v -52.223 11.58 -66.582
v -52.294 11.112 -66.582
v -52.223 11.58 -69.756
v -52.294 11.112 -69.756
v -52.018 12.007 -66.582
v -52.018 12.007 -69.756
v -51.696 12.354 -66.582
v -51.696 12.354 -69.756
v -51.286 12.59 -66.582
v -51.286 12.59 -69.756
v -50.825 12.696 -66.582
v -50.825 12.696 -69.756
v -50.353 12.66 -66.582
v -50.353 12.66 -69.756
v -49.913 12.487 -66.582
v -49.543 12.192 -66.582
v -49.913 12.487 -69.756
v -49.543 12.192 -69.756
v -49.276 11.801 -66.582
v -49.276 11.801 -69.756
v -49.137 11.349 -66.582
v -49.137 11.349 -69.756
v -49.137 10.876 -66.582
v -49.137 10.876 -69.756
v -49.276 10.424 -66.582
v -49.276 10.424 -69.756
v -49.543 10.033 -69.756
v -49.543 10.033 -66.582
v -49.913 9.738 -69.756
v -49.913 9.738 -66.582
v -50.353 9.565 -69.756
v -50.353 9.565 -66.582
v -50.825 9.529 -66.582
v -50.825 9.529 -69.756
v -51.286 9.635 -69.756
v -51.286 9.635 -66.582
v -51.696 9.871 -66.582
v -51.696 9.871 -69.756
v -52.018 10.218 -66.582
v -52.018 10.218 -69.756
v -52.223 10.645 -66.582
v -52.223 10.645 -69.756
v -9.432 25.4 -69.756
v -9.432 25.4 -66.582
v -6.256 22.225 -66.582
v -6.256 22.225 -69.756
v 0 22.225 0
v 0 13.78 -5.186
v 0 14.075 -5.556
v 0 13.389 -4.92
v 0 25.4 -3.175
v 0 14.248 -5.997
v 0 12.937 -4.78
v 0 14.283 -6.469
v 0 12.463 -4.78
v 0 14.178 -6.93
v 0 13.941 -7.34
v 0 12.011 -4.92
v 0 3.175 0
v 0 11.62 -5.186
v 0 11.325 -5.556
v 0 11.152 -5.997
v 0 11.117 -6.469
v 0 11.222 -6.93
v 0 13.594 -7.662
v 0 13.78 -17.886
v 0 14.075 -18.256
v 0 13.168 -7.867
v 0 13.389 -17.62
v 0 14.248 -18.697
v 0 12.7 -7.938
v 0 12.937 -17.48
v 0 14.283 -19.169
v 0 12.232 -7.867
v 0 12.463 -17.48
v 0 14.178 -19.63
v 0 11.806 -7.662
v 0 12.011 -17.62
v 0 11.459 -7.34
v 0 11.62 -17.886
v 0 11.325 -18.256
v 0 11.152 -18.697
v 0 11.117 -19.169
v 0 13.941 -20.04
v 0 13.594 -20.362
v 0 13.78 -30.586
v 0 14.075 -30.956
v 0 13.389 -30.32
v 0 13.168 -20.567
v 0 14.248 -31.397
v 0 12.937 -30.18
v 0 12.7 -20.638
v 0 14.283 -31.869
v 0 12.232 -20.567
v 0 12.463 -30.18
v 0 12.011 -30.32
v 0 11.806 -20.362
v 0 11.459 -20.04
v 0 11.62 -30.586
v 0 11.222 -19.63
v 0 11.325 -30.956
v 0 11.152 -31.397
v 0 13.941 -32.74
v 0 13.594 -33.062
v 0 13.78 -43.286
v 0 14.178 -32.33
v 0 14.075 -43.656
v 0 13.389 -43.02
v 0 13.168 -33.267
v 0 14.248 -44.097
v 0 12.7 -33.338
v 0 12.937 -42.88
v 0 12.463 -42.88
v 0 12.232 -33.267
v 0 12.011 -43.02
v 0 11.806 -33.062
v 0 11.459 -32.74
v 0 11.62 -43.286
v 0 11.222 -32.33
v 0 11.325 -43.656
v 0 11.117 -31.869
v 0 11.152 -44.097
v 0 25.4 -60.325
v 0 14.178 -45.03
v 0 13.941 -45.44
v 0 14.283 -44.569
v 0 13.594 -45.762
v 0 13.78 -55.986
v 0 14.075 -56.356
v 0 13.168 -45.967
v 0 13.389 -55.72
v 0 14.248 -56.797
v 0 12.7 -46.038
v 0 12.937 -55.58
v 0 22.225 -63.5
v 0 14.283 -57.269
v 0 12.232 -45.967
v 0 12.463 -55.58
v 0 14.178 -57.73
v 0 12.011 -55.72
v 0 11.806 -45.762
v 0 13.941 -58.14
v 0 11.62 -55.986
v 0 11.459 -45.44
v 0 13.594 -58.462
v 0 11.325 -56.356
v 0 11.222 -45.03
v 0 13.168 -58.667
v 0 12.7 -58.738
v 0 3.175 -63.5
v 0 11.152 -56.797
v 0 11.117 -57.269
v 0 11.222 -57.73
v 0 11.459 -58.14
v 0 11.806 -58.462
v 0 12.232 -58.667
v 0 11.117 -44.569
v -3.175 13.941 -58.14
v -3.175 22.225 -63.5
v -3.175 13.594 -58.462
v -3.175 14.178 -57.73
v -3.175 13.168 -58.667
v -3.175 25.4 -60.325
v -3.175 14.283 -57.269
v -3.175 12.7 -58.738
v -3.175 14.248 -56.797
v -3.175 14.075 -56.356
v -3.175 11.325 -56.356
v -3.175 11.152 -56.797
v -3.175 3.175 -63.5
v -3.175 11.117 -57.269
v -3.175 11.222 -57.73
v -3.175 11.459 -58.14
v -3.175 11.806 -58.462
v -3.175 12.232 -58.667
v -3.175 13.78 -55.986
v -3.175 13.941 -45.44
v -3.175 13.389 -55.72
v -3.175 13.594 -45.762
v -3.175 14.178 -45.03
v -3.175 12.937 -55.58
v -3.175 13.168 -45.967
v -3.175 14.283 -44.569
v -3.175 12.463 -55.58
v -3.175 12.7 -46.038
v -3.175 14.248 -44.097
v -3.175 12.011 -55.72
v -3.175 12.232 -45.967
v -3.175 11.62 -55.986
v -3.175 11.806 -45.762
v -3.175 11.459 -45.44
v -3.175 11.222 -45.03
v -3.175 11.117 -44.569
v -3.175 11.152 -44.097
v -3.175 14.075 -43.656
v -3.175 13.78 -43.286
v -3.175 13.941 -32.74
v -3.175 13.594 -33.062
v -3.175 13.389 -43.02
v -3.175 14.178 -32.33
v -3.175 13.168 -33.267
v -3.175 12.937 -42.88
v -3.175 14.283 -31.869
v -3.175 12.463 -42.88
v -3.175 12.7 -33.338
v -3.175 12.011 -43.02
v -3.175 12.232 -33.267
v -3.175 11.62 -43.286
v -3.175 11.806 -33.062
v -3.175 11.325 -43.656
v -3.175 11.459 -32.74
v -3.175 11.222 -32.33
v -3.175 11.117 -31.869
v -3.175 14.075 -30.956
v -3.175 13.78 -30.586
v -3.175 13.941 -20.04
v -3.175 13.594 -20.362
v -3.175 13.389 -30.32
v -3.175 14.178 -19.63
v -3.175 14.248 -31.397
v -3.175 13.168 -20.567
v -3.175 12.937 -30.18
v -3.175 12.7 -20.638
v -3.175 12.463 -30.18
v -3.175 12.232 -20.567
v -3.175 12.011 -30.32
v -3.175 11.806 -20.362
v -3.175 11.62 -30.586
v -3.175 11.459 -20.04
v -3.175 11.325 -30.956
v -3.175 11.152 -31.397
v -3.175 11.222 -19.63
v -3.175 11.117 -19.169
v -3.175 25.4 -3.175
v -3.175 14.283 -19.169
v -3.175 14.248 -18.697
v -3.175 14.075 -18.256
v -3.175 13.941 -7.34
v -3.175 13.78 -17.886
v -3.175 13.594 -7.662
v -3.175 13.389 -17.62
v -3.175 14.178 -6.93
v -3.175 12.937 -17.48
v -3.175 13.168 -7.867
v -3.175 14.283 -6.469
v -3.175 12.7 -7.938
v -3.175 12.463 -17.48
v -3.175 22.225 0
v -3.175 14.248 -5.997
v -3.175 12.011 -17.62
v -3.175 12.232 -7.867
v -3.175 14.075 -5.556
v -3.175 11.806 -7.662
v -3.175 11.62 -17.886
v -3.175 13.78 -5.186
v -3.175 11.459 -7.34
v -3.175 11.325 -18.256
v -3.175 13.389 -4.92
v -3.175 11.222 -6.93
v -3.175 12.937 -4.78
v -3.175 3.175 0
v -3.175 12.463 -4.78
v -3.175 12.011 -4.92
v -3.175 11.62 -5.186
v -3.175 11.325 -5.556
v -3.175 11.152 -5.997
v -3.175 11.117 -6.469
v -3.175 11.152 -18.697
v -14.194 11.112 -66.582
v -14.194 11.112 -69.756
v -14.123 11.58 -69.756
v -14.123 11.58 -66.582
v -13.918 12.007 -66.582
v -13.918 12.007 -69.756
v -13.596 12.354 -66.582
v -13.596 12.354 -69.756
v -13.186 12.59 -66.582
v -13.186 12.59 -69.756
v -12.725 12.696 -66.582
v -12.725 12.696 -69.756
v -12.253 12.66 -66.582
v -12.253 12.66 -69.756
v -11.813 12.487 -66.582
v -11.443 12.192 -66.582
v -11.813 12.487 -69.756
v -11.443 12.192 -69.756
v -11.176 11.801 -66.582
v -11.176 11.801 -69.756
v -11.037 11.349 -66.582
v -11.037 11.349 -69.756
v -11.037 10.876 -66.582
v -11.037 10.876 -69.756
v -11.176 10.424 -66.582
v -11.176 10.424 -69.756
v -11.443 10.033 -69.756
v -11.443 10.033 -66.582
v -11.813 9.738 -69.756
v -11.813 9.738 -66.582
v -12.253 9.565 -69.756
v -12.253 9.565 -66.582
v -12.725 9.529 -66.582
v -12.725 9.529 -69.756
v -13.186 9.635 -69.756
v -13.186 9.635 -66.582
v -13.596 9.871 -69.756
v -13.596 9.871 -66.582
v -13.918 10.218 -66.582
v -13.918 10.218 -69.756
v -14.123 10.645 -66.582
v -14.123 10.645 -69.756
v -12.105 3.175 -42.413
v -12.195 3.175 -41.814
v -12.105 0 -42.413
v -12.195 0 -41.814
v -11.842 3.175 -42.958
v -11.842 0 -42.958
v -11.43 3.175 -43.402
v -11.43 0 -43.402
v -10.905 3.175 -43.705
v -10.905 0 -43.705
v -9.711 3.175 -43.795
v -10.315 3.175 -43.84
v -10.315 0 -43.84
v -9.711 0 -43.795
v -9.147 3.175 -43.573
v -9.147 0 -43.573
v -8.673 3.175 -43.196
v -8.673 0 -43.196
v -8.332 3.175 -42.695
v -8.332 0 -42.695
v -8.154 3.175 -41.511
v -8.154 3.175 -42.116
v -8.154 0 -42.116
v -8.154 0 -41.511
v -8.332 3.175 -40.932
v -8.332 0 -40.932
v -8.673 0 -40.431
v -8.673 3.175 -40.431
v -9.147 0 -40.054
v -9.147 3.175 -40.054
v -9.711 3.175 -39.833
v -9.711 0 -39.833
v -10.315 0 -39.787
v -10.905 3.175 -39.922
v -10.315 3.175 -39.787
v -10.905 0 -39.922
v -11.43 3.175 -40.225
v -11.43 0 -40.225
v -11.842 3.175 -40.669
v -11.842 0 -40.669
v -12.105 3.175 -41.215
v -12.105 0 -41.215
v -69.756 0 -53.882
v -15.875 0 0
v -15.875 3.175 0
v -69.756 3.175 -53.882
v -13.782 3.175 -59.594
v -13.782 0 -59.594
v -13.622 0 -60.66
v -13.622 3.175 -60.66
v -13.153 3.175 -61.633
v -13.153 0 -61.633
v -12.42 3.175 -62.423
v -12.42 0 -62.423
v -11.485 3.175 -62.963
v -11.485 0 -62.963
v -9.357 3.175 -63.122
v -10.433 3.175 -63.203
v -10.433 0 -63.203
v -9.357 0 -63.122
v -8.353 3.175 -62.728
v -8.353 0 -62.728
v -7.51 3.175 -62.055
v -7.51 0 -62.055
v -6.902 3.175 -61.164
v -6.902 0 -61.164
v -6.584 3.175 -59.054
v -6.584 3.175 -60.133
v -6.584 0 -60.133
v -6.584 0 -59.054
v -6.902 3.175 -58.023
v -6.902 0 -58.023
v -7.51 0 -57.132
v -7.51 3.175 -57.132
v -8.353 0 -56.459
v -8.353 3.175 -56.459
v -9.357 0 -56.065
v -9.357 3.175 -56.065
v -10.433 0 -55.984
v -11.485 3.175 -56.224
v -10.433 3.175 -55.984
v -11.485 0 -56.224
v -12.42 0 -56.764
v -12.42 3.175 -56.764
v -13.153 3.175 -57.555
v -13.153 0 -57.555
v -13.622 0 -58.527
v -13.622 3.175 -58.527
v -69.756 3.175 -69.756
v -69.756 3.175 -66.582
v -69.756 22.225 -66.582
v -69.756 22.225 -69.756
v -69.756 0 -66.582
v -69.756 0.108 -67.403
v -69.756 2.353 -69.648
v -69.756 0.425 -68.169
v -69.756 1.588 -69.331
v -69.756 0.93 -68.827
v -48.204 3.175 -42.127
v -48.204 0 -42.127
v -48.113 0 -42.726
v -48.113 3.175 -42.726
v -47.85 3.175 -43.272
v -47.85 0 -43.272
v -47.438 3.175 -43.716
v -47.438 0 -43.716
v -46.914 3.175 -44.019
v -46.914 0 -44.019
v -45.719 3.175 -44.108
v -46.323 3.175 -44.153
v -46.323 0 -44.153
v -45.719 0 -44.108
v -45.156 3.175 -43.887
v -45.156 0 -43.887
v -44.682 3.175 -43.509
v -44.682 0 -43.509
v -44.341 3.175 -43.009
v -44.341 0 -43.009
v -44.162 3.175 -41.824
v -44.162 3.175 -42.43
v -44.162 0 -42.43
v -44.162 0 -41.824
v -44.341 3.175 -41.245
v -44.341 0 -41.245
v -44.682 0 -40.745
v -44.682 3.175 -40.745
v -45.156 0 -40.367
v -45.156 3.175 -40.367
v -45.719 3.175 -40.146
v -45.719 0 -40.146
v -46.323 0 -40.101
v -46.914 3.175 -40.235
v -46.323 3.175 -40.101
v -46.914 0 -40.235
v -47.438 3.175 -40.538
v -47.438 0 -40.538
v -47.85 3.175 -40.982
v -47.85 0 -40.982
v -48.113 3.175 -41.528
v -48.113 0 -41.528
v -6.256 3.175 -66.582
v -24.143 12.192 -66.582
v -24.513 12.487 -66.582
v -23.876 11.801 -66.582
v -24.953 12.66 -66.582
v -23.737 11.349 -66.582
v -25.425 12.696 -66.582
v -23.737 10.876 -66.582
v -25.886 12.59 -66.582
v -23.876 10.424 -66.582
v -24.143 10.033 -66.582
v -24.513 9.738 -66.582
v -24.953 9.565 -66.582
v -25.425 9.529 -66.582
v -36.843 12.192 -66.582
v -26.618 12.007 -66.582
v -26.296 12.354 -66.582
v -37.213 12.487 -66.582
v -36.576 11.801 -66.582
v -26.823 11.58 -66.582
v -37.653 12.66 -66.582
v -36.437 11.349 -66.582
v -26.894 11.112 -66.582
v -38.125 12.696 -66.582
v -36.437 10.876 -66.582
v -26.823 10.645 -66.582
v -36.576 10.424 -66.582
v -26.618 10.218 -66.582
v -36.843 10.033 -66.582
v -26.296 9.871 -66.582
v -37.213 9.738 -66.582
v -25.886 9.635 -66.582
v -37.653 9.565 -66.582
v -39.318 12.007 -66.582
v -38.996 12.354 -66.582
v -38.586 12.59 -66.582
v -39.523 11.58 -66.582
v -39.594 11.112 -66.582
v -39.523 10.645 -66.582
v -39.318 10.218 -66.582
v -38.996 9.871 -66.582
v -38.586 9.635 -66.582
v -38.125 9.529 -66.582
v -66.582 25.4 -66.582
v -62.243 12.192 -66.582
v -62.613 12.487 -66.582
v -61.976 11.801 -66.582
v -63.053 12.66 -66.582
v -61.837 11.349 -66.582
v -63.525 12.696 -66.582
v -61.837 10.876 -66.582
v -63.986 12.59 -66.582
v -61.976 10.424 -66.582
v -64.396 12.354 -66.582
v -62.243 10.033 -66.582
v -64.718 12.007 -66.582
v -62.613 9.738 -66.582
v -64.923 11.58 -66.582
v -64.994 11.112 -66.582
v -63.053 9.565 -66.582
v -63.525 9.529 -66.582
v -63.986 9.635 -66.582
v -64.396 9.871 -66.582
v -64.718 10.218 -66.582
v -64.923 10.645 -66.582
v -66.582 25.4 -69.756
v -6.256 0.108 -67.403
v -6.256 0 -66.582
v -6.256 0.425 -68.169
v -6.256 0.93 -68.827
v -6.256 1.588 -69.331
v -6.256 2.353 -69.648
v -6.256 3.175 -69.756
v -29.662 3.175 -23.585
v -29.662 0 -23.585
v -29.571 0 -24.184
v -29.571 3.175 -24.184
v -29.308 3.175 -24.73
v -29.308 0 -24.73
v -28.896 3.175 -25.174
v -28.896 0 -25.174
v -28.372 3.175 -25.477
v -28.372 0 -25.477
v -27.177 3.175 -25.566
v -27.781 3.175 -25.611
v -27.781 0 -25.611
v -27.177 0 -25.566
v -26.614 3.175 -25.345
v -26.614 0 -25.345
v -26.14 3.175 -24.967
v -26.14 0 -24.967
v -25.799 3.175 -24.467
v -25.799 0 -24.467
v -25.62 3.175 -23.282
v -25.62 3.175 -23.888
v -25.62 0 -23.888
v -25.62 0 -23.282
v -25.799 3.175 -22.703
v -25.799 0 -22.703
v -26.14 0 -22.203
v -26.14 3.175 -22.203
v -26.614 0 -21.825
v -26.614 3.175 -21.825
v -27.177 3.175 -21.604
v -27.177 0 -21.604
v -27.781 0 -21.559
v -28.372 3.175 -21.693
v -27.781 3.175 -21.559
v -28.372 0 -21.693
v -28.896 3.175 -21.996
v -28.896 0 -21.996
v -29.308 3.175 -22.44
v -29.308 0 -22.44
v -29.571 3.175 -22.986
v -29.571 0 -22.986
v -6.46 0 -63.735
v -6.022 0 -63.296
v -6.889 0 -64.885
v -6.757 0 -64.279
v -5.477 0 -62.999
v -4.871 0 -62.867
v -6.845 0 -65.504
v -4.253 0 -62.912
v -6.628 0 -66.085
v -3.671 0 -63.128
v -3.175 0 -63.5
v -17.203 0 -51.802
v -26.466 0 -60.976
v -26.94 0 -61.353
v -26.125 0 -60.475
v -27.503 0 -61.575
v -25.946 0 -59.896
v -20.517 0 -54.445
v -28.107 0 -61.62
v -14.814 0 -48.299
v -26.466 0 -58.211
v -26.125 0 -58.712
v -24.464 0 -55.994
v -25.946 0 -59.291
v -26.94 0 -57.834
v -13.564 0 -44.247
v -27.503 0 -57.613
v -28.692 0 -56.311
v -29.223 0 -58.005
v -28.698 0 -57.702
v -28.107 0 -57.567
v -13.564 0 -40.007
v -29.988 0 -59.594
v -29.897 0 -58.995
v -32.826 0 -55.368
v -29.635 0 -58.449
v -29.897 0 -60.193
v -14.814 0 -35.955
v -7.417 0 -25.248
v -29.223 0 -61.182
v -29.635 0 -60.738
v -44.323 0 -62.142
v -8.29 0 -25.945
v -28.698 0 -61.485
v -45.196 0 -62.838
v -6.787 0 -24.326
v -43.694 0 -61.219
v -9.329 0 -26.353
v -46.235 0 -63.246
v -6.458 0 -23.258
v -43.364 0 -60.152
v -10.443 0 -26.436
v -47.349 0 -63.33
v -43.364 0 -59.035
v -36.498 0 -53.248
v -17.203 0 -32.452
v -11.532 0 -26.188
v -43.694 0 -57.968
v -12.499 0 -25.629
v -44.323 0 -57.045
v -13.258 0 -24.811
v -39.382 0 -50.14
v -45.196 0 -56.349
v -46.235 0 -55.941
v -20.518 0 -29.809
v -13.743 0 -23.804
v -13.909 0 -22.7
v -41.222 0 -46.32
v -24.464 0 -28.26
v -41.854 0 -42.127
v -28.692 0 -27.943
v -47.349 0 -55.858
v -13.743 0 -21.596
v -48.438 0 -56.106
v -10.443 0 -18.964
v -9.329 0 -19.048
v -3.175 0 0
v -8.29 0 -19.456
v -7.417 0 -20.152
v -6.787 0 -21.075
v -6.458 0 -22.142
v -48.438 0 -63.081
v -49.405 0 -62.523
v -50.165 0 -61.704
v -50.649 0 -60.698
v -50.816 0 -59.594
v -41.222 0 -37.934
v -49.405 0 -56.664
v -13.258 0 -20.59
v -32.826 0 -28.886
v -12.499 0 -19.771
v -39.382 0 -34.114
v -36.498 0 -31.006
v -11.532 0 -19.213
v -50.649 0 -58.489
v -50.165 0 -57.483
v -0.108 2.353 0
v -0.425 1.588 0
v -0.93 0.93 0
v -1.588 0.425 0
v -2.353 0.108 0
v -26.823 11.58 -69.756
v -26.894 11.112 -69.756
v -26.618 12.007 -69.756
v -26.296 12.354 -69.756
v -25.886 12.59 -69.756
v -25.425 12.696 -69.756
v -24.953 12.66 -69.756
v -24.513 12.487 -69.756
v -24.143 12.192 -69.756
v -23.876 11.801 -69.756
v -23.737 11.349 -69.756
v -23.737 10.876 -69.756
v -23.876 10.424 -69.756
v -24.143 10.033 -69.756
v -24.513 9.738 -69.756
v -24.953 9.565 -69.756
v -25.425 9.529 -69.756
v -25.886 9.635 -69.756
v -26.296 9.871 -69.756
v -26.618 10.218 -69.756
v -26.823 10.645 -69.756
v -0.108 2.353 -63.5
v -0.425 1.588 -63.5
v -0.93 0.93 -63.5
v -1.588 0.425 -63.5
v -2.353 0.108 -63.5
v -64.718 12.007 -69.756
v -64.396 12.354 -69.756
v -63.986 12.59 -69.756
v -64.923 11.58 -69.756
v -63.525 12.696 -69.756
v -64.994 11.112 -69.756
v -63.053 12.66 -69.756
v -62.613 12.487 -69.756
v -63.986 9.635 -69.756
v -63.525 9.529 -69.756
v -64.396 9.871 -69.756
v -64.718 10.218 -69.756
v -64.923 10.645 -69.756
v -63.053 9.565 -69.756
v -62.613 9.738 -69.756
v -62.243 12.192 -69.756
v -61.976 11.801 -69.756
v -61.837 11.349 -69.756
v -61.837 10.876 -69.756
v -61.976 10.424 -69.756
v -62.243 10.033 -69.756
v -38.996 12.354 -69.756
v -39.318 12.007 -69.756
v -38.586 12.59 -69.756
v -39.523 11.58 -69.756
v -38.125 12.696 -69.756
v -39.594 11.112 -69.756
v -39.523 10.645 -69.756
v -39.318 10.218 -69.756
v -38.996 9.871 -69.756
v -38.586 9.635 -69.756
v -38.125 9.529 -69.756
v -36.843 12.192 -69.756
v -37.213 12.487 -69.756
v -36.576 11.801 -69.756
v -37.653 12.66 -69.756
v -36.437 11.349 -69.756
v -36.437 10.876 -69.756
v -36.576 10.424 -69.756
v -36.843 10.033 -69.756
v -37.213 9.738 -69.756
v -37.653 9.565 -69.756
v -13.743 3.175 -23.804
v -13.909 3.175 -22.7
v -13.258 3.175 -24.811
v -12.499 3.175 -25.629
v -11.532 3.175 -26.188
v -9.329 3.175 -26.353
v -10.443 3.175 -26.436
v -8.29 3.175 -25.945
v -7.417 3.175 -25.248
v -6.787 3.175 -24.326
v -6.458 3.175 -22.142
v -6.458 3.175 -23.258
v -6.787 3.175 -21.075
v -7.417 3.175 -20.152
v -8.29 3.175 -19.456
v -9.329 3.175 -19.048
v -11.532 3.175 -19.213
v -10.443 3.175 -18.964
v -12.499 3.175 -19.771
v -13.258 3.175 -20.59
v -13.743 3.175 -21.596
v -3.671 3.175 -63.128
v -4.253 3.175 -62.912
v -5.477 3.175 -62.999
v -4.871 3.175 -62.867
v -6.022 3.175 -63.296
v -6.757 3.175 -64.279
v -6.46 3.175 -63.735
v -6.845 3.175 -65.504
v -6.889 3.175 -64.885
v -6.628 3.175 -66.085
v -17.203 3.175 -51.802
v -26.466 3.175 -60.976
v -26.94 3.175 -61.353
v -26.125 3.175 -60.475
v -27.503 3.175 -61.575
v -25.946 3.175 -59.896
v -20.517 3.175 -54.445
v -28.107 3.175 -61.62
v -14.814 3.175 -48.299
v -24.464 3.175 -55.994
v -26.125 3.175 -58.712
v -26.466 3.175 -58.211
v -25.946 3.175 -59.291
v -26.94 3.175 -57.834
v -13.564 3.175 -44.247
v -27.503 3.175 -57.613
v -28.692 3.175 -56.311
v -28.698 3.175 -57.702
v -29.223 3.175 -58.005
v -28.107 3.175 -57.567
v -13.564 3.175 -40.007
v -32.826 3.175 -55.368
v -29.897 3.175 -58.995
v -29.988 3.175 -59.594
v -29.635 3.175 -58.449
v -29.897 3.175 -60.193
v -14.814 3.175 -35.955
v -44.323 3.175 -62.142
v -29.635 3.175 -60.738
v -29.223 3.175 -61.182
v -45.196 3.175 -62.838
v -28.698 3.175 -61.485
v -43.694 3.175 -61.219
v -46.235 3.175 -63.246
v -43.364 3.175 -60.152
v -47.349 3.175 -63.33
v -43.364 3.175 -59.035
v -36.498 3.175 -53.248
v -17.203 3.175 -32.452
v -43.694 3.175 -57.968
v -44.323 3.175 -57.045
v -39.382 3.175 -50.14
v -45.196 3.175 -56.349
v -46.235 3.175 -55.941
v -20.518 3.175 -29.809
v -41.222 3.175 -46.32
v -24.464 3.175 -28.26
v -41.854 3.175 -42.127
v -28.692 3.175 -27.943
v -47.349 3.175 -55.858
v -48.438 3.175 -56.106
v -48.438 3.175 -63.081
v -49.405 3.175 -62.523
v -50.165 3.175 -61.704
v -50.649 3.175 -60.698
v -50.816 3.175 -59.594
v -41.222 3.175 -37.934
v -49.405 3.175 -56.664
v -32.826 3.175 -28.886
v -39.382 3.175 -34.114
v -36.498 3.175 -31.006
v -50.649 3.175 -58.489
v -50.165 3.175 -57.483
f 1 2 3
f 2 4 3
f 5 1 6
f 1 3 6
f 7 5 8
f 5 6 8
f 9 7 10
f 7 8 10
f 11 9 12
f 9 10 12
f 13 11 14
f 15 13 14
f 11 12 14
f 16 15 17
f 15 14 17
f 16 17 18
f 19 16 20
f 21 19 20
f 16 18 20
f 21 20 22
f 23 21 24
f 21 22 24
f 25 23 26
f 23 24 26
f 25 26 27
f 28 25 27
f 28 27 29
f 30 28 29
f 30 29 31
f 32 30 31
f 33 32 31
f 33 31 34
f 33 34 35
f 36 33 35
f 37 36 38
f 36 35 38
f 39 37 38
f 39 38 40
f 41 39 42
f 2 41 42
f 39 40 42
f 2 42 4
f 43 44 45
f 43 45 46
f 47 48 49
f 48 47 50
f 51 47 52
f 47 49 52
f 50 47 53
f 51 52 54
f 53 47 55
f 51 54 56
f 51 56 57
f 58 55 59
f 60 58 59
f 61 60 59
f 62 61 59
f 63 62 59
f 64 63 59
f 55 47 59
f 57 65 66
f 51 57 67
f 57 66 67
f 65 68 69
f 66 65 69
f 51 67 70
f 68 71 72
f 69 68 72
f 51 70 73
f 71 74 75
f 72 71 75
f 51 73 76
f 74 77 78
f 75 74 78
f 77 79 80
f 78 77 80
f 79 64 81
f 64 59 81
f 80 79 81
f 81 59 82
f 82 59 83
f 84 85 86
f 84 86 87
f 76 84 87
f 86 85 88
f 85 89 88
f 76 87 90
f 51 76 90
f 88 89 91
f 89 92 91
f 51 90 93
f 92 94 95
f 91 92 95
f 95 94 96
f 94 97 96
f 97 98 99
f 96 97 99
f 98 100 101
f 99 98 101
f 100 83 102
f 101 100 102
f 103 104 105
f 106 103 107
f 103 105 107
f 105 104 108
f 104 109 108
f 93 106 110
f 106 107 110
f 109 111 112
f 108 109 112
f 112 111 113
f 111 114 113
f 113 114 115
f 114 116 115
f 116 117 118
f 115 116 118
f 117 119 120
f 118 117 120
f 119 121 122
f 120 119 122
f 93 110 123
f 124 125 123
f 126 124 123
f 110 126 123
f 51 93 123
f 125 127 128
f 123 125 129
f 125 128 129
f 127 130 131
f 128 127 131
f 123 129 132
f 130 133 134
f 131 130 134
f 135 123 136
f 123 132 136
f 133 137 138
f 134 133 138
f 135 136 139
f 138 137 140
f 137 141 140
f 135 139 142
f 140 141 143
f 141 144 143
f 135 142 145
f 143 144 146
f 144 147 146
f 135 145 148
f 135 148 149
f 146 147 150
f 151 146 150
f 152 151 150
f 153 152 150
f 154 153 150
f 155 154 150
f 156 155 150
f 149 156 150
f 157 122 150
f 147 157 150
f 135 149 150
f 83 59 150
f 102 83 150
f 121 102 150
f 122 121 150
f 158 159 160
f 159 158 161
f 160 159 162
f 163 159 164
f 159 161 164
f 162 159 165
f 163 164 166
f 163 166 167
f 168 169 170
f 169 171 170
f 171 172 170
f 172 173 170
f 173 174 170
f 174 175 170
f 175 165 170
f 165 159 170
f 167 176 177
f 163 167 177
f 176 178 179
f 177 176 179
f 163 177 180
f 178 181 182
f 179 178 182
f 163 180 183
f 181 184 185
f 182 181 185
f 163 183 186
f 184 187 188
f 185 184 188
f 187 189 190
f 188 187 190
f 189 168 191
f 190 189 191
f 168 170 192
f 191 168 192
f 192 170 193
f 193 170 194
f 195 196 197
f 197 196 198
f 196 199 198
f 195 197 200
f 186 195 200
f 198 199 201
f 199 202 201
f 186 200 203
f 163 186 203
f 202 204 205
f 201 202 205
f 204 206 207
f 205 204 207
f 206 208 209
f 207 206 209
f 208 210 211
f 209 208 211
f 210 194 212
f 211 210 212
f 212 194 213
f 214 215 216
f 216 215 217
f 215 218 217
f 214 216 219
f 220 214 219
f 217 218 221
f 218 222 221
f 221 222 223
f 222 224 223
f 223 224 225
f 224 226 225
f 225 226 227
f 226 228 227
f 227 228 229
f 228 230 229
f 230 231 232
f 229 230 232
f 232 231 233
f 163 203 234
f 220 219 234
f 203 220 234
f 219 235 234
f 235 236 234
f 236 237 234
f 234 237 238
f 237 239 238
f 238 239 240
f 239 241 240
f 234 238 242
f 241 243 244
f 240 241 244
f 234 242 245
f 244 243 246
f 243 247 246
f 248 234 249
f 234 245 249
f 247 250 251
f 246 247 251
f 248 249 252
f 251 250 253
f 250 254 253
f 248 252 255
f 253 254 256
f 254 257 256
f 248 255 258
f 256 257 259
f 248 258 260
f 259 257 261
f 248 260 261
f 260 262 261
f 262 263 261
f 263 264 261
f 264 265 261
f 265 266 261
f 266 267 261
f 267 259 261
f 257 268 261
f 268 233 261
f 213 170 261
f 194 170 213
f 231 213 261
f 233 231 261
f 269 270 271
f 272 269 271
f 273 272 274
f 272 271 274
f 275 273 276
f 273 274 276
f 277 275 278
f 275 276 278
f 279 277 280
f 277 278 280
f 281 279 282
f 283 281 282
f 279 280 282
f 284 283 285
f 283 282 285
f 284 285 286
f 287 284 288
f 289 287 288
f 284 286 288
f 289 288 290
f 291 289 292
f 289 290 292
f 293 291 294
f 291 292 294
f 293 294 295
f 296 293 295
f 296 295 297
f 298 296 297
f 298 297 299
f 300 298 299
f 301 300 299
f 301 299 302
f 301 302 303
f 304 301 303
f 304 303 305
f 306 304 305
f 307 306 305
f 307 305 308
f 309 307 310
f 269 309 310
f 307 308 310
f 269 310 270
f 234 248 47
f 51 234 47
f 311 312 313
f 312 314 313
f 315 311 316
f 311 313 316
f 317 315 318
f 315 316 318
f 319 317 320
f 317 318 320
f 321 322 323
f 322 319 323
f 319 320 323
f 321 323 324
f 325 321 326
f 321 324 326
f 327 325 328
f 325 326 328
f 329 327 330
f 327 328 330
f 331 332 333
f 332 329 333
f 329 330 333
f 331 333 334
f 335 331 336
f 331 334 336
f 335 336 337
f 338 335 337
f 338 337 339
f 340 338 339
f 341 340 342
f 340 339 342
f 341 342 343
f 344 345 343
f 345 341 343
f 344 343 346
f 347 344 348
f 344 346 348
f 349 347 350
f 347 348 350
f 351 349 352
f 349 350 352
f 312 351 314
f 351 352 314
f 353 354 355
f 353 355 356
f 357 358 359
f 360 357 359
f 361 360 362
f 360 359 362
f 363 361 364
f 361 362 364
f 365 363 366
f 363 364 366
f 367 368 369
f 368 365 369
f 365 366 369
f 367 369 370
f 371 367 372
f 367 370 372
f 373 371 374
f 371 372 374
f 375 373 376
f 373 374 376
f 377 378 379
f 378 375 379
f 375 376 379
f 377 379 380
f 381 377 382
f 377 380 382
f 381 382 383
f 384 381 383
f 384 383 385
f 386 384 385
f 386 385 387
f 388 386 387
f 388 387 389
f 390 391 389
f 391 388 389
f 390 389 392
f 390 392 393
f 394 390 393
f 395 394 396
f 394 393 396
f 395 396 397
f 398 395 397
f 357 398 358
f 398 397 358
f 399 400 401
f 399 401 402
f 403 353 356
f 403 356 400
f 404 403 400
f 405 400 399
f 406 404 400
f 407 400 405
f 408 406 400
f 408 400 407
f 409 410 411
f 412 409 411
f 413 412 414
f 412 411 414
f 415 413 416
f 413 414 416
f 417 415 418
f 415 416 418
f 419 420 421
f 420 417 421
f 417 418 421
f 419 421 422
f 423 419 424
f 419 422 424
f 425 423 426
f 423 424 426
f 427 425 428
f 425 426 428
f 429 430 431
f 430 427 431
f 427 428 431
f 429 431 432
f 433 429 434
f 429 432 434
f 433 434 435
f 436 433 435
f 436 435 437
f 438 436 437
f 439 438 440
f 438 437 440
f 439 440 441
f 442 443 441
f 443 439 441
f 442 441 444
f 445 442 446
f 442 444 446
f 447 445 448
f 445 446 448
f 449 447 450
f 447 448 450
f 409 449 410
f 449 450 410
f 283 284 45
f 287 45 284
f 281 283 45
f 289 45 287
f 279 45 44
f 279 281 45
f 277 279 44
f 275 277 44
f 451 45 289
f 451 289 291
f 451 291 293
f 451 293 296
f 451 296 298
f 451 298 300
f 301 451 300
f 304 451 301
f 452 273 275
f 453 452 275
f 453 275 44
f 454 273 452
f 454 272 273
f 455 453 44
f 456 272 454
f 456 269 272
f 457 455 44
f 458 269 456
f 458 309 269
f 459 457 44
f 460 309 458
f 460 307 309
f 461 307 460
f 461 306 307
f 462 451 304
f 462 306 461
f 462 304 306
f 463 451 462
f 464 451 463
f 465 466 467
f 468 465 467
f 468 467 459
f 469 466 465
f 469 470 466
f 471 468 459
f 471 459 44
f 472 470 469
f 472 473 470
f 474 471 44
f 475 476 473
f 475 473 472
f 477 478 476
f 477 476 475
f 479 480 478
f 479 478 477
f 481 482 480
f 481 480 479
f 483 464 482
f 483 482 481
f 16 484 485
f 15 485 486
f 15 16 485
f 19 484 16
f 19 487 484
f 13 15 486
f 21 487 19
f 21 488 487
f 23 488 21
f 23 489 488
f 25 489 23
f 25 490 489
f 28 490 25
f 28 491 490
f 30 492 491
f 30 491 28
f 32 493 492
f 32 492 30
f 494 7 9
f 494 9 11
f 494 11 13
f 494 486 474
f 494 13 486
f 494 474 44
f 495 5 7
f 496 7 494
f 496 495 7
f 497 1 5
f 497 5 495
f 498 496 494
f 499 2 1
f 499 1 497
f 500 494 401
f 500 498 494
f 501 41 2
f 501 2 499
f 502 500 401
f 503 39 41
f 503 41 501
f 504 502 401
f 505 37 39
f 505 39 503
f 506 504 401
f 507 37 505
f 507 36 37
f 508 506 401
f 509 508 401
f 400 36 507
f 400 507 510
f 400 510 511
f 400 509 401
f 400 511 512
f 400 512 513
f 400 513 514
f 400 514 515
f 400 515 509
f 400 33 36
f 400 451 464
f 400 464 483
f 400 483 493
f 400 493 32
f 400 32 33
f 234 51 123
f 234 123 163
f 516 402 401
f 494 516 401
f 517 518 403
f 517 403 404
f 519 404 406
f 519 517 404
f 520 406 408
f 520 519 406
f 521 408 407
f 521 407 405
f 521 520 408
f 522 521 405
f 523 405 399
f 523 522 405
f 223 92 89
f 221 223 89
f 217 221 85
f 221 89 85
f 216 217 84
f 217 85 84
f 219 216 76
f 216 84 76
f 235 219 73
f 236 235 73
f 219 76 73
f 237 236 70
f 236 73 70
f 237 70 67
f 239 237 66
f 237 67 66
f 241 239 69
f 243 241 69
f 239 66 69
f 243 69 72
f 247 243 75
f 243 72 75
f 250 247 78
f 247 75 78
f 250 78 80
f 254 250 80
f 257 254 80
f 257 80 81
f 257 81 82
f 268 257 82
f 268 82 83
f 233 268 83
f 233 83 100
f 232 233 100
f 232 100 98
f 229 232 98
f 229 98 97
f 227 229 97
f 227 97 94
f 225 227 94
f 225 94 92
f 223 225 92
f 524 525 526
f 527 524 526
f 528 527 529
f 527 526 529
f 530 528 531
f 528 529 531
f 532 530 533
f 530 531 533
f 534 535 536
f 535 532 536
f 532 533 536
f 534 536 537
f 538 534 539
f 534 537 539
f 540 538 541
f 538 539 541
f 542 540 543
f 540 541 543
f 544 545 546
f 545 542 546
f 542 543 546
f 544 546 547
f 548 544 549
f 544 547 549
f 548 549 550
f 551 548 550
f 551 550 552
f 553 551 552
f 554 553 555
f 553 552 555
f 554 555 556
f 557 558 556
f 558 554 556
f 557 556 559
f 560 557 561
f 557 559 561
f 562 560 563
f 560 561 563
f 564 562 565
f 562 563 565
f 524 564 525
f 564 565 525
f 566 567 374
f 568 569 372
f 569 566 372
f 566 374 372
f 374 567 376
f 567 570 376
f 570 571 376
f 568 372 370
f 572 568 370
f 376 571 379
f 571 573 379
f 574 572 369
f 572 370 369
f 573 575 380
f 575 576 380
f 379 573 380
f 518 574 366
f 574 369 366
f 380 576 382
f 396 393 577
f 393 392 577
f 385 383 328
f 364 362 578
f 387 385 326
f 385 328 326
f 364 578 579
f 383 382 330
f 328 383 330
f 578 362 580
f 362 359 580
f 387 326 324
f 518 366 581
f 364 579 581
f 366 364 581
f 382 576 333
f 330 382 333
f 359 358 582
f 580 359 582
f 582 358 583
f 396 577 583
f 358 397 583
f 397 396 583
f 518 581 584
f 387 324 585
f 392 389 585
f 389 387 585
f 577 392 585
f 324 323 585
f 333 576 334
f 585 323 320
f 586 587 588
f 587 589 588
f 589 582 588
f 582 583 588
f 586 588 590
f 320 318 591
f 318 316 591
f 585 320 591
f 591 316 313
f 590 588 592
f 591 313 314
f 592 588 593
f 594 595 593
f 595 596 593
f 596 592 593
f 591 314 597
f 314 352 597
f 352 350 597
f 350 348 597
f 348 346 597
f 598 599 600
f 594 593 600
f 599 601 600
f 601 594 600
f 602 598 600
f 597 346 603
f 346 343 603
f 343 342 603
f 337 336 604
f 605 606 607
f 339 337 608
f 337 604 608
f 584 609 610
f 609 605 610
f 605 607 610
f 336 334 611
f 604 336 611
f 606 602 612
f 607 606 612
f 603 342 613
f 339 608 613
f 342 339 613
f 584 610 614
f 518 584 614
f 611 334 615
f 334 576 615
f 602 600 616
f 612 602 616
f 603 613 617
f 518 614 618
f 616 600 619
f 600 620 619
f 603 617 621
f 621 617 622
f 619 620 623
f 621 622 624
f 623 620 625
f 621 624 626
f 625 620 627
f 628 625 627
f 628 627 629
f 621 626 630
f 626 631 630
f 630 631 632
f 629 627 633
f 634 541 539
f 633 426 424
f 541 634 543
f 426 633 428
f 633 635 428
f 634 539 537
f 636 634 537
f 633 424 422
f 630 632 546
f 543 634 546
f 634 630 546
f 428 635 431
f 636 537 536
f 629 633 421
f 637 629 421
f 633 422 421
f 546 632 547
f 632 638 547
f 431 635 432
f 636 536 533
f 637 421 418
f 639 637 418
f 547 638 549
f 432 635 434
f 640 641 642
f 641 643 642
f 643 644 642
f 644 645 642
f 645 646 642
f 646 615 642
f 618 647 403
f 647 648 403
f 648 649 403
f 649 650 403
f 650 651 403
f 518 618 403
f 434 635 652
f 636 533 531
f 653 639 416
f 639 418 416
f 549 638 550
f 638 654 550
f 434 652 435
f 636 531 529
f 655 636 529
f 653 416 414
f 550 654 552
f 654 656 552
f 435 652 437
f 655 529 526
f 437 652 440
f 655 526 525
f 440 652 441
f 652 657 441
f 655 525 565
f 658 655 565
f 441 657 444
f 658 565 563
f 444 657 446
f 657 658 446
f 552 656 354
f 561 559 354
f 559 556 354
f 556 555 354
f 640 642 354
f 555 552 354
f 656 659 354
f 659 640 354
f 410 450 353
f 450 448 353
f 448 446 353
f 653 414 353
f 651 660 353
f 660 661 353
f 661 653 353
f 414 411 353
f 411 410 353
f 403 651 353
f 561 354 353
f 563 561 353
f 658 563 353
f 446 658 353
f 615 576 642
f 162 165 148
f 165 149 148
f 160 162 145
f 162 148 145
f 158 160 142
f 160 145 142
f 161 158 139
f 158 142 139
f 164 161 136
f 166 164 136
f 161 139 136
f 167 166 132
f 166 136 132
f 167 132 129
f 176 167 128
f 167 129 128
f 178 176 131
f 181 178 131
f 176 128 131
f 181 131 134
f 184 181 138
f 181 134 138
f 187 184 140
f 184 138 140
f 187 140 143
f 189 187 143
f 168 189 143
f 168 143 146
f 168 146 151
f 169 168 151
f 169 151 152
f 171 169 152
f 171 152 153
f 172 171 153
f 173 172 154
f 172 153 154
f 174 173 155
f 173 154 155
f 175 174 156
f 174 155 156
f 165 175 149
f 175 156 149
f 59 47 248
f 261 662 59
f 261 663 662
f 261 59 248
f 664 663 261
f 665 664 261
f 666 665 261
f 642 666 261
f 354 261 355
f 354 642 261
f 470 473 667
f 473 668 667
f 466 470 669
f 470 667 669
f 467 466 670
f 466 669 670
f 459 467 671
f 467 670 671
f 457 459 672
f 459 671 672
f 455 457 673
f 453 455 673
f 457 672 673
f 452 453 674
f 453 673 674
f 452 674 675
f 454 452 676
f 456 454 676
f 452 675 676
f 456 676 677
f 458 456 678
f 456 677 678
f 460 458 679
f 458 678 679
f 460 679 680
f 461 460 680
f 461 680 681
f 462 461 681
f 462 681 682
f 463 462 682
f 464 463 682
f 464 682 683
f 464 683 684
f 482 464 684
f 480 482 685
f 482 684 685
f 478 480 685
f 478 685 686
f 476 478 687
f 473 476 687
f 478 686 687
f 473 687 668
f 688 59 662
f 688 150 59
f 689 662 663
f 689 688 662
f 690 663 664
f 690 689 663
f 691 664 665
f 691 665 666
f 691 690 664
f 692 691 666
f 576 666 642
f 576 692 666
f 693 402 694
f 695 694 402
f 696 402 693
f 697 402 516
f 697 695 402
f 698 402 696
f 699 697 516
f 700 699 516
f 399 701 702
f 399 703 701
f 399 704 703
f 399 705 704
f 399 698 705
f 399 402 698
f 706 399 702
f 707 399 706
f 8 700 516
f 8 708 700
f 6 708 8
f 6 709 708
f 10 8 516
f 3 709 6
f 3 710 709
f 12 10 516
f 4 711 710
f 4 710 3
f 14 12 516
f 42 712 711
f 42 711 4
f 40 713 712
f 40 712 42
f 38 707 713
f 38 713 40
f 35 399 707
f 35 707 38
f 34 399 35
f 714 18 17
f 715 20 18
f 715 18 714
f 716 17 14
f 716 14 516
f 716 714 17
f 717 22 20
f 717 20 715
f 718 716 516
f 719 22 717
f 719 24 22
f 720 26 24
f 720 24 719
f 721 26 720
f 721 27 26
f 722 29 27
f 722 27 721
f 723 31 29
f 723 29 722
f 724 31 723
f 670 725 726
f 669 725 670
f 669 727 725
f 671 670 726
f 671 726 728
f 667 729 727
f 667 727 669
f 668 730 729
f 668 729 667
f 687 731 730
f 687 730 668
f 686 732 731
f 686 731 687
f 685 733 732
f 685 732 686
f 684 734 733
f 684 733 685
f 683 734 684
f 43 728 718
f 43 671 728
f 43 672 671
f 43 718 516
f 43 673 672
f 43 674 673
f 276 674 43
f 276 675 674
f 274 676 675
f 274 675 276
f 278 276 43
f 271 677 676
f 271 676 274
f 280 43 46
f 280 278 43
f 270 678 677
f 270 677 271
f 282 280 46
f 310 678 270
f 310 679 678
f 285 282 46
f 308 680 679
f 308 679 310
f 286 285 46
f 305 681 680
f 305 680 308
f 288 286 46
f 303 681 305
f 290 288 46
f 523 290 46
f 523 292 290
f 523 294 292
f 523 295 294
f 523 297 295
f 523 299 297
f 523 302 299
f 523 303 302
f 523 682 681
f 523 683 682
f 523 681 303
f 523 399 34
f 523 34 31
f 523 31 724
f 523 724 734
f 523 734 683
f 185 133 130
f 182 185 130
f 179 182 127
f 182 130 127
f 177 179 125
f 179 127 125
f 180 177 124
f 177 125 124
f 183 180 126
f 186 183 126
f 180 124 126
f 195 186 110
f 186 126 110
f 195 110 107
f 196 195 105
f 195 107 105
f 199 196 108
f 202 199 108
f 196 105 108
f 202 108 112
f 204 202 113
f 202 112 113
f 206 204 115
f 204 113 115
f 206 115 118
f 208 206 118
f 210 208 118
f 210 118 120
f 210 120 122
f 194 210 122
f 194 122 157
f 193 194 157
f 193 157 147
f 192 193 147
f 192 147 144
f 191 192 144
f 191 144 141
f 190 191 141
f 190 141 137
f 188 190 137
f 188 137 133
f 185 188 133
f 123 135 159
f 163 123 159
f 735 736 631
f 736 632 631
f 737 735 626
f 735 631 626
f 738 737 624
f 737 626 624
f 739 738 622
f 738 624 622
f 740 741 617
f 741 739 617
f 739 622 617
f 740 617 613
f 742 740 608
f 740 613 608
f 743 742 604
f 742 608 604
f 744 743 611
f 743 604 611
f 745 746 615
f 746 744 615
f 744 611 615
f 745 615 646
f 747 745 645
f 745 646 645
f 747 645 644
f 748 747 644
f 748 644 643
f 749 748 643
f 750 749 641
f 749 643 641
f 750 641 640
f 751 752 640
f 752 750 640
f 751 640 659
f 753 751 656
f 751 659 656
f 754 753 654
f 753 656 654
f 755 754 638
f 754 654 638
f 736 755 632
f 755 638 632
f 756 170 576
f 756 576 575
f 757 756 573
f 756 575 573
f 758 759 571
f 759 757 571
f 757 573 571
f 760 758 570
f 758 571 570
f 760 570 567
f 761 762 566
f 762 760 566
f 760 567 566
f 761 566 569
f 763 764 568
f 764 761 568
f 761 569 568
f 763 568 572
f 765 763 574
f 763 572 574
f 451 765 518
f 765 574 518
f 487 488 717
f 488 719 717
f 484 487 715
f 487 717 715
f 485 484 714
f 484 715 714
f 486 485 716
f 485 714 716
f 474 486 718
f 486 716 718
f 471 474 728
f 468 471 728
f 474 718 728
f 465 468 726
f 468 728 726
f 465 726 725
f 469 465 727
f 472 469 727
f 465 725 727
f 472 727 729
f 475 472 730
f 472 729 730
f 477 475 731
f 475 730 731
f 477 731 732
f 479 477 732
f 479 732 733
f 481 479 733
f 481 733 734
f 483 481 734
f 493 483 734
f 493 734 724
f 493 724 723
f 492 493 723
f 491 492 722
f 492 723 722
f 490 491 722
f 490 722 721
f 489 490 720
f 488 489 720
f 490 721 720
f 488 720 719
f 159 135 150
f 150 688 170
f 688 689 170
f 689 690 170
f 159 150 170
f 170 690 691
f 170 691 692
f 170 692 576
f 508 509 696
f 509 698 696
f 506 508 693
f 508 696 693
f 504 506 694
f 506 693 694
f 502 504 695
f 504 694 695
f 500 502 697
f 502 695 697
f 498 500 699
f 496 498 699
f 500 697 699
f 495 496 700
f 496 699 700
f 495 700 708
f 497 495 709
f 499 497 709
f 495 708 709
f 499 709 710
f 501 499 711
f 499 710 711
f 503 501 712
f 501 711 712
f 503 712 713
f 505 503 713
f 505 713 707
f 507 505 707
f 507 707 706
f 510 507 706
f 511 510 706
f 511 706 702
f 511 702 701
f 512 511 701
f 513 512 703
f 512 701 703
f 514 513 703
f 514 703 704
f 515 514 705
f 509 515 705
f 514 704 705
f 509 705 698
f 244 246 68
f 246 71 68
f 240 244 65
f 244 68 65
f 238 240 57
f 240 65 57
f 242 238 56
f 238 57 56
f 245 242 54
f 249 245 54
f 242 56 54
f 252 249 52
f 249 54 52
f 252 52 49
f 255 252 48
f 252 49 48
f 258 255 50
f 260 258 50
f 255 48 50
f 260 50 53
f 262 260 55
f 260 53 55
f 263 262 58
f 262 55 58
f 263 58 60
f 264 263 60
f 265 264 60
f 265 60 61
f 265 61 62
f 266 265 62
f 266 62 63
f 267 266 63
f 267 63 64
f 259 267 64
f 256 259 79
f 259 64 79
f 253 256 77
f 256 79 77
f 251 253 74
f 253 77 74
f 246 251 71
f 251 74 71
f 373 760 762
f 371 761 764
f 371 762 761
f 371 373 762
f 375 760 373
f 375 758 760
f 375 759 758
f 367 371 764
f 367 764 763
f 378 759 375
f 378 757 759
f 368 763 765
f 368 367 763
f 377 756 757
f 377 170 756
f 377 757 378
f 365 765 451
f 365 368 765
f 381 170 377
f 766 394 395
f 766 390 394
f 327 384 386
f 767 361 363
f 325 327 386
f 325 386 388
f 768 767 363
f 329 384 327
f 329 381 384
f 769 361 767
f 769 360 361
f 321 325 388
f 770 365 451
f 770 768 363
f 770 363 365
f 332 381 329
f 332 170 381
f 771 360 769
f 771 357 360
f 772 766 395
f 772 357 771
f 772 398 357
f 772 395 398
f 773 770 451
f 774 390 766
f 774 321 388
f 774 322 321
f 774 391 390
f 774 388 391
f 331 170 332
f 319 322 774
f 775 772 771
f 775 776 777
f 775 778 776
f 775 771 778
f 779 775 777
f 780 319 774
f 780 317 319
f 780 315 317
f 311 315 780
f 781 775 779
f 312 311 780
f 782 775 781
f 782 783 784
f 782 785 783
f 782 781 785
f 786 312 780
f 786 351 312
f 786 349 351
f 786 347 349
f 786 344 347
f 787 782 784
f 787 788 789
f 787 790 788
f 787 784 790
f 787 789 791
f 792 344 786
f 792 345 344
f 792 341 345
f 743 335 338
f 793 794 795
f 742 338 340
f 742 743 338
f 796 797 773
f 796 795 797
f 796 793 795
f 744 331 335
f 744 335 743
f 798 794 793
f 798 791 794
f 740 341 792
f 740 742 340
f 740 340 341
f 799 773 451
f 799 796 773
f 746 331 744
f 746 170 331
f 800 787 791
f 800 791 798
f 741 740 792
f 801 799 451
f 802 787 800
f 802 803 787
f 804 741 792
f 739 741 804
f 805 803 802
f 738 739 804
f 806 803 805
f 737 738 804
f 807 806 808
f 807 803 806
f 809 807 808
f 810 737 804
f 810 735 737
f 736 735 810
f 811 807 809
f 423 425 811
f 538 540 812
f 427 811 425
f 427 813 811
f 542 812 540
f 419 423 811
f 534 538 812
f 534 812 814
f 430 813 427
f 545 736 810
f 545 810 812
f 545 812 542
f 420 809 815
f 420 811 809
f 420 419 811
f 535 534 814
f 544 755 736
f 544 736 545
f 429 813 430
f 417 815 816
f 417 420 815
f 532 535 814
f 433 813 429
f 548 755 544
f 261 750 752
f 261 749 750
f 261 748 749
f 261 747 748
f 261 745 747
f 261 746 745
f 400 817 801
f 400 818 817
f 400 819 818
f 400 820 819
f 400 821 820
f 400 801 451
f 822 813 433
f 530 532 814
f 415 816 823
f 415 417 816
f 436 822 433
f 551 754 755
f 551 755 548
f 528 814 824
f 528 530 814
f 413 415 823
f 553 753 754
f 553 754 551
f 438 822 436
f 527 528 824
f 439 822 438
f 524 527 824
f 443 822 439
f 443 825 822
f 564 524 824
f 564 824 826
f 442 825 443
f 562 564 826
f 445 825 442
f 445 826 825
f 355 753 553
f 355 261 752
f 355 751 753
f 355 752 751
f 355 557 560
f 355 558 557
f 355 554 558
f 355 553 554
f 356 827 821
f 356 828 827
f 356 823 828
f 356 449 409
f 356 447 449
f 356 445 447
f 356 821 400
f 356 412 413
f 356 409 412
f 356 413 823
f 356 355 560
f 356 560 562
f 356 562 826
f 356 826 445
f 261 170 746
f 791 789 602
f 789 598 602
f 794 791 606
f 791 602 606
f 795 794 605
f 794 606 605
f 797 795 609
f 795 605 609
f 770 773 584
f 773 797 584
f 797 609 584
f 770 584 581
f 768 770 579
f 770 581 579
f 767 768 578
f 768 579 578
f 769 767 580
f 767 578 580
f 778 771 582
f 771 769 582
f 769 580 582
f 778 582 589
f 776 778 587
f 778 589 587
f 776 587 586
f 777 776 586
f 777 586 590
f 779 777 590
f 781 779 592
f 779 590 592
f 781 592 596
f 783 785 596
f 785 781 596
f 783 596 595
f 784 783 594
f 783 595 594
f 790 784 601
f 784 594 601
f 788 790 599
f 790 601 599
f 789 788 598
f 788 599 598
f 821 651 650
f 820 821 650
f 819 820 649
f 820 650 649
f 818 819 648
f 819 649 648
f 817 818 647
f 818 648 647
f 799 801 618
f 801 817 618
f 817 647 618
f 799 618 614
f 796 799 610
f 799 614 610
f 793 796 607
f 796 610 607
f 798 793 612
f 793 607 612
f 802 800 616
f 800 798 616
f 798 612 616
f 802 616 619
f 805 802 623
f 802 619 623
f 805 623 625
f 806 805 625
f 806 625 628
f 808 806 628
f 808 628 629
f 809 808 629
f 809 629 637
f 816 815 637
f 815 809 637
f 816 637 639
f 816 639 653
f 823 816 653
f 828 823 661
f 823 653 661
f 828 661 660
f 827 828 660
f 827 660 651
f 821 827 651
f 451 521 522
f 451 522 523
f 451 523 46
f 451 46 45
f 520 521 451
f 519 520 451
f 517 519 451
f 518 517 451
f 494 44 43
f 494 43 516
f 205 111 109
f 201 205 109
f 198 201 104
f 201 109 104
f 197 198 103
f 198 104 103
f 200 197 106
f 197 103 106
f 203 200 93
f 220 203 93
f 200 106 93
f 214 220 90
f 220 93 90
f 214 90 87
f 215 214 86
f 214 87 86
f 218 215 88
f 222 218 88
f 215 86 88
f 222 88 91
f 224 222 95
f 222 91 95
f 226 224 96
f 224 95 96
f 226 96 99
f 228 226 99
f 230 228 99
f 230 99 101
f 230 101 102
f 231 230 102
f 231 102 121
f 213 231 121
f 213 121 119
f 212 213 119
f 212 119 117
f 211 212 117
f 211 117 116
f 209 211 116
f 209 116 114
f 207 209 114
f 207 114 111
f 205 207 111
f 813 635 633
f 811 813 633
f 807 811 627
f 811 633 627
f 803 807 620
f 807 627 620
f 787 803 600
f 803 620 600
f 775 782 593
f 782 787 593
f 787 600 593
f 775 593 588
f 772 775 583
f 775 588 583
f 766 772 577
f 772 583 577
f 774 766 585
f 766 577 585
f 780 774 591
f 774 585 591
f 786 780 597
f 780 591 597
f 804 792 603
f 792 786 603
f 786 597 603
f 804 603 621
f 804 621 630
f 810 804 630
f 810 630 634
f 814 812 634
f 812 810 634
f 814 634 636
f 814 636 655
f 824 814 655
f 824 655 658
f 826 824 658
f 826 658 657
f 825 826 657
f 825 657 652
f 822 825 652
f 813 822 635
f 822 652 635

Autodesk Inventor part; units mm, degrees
ref_plane "YZ Plane" through (0, 0, 0) normal (1, 0, 0) x (0, 1, 0)
ref_plane "XZ Plane" through (0, 0, 0) normal (0, 1, 0) x (-1, 0, 0)
ref_plane "XY Plane" through (0, 0, 0) normal (0, 0, 1) x (1, 0, 0)
sketch "Sketch1" plane through (0, 0, 0) normal (0, 1, 0) x (-1, 0, 0)
  line L0 (0, 0) -> (0, -63.5)
  line L1 (0, -63.5) -> (3.175, -63.5)
  line L2 (3.175, -63.5) -> (3.175, 0)
  line L3 (3.175, 0) -> (0, 0)
  line L4 (3.175, 0) -> (15.875, 0)
  line L5 (15.875, 0) -> (69.7565, -53.8815)
  line L6 (69.7565, -53.8815) -> (69.7565, -66.5815)
  line L7 (69.7565, -66.5815) -> (69.7565, -69.7565)
  line L8 (69.7565, -69.7565) -> (6.2565, -69.7565)
  line L9 (6.2565, -69.7565) -> (6.2565, -66.5815)
  line L10 (6.2565, -66.5815) -> (69.7565, -66.5815)
  arc A0 (6.2565, -66.5815) -> (3.175, -63.5) centre (4.7158, -65.0408) ccw
  circle A1 centre (10.1629, -59.5936) radius 3.6195
  line L11 (10.1629, -55.9741) -> (10.1629, -43.8456) construction
  circle A2 centre (10.1629, -41.8136) radius 2.032
  line L12 (13.7824, -59.5936) -> (25.9236, -59.5936) construction
  circle A3 centre (27.9556, -59.5936) radius 2.032
  line L13 (6.2565, -63.5) -> (42.8158, -26.9408) construction
  circle A4 centre (27.6295, -42.127) radius 14.224
  circle A5 centre (46.1715, -42.127) radius 2.032
  line L14 (27.6295, -27.903) -> (27.6295, -25.617) construction
  circle A6 centre (27.6295, -23.585) radius 2.032
  circle A7 centre (47.0691, -59.5936) radius 3.7465
  line L15 (10.1629, -39.7816) -> (10.1629, -26.4466) construction
  circle A8 centre (10.1629, -22.7001) radius 3.7465
  dimension "d6" = 63.5
  dimension "d7" = 3.175
  dimension "d8" = 12.7
  dimension "d9" = 76.2
  dimension "d10" = 135
  dimension "d11" = 12.7
  dimension "d12" = 3.175
  dimension "d13" = 63.5
  dimension "d14" = 3.175
  dimension "d18" = 12.1285
  dimension "d20" = 12.1412
  dimension "d26" = 2.286
  dimension "d30" = 13.335
extrude "Extrusion1" add sketch "Sketch1" along normal blind 3.175 contours L4 L5 L6 L10 A0 L2
extrude "Extrusion2" add sketch "Sketch1" along normal blind 25.4 contours L3 L2 L1 L0 | L10 L7 L8 L9
chamfer "Chamfer1" distance 3.175 angle 45 4 edges at (-6.2565, 25.4, -68.169) (-1.5875, 25.4, -63.5) (-1.5875, 25.4, 0) (-69.7565, 25.4, -68.169)
sketch "Sketch2" plane through (0, 0, 0) normal (1, 0, 0) x (0, 0, -1)
  line L0 (0, 3.175) -> (0, 22.225) projected
  circle A0 centre (6.35, 12.7) radius 1.5875
  circle A1 centre (19.05, 12.7) radius 1.5875
  circle A2 centre (31.75, 12.7) radius 1.5875
  circle A3 centre (44.45, 12.7) radius 1.5875
  circle A4 centre (57.15, 12.7) radius 1.5875
  point P0 (0, 0)
  dimension "d44" = 3.175
  dimension "d46" = 3.175
  dimension "d48" = 3.175
  dimension "d50" = 3.175
sketch "Sketch3" plane through (-6.2565, 0, -69.7565) normal (0, 0, -1) x (-1, 0, 0)
  line L0 (0, 0) -> (0, 22.225) projected
  circle A0 centre (6.35, 11.1125) radius 1.5875
  circle A1 centre (19.05, 11.1125) radius 1.5875
  circle A2 centre (31.75, 11.1125) radius 1.5875
  circle A3 centre (44.45, 11.1125) radius 1.5875
  circle A4 centre (57.15, 11.1125) radius 1.5875
  point P0 (-6.2565, 0)
  dimension "d54" = 3.175
  dimension "d56" = 3.175
  dimension "d58" = 3.175
  dimension "d60" = 3.175
  dimension "d62" = 3.175
extrude "Extrusion3" cut sketch "Sketch2" against normal blind 3.175
extrude "Extrusion4" cut sketch "Sketch3" against normal blind 3.175
fillet "Fillet1" radius 3.175 2 edges at (0, 0, -31.75) (-38.0065, 0, -69.7565)
properties part number "triangular L-bracket"
